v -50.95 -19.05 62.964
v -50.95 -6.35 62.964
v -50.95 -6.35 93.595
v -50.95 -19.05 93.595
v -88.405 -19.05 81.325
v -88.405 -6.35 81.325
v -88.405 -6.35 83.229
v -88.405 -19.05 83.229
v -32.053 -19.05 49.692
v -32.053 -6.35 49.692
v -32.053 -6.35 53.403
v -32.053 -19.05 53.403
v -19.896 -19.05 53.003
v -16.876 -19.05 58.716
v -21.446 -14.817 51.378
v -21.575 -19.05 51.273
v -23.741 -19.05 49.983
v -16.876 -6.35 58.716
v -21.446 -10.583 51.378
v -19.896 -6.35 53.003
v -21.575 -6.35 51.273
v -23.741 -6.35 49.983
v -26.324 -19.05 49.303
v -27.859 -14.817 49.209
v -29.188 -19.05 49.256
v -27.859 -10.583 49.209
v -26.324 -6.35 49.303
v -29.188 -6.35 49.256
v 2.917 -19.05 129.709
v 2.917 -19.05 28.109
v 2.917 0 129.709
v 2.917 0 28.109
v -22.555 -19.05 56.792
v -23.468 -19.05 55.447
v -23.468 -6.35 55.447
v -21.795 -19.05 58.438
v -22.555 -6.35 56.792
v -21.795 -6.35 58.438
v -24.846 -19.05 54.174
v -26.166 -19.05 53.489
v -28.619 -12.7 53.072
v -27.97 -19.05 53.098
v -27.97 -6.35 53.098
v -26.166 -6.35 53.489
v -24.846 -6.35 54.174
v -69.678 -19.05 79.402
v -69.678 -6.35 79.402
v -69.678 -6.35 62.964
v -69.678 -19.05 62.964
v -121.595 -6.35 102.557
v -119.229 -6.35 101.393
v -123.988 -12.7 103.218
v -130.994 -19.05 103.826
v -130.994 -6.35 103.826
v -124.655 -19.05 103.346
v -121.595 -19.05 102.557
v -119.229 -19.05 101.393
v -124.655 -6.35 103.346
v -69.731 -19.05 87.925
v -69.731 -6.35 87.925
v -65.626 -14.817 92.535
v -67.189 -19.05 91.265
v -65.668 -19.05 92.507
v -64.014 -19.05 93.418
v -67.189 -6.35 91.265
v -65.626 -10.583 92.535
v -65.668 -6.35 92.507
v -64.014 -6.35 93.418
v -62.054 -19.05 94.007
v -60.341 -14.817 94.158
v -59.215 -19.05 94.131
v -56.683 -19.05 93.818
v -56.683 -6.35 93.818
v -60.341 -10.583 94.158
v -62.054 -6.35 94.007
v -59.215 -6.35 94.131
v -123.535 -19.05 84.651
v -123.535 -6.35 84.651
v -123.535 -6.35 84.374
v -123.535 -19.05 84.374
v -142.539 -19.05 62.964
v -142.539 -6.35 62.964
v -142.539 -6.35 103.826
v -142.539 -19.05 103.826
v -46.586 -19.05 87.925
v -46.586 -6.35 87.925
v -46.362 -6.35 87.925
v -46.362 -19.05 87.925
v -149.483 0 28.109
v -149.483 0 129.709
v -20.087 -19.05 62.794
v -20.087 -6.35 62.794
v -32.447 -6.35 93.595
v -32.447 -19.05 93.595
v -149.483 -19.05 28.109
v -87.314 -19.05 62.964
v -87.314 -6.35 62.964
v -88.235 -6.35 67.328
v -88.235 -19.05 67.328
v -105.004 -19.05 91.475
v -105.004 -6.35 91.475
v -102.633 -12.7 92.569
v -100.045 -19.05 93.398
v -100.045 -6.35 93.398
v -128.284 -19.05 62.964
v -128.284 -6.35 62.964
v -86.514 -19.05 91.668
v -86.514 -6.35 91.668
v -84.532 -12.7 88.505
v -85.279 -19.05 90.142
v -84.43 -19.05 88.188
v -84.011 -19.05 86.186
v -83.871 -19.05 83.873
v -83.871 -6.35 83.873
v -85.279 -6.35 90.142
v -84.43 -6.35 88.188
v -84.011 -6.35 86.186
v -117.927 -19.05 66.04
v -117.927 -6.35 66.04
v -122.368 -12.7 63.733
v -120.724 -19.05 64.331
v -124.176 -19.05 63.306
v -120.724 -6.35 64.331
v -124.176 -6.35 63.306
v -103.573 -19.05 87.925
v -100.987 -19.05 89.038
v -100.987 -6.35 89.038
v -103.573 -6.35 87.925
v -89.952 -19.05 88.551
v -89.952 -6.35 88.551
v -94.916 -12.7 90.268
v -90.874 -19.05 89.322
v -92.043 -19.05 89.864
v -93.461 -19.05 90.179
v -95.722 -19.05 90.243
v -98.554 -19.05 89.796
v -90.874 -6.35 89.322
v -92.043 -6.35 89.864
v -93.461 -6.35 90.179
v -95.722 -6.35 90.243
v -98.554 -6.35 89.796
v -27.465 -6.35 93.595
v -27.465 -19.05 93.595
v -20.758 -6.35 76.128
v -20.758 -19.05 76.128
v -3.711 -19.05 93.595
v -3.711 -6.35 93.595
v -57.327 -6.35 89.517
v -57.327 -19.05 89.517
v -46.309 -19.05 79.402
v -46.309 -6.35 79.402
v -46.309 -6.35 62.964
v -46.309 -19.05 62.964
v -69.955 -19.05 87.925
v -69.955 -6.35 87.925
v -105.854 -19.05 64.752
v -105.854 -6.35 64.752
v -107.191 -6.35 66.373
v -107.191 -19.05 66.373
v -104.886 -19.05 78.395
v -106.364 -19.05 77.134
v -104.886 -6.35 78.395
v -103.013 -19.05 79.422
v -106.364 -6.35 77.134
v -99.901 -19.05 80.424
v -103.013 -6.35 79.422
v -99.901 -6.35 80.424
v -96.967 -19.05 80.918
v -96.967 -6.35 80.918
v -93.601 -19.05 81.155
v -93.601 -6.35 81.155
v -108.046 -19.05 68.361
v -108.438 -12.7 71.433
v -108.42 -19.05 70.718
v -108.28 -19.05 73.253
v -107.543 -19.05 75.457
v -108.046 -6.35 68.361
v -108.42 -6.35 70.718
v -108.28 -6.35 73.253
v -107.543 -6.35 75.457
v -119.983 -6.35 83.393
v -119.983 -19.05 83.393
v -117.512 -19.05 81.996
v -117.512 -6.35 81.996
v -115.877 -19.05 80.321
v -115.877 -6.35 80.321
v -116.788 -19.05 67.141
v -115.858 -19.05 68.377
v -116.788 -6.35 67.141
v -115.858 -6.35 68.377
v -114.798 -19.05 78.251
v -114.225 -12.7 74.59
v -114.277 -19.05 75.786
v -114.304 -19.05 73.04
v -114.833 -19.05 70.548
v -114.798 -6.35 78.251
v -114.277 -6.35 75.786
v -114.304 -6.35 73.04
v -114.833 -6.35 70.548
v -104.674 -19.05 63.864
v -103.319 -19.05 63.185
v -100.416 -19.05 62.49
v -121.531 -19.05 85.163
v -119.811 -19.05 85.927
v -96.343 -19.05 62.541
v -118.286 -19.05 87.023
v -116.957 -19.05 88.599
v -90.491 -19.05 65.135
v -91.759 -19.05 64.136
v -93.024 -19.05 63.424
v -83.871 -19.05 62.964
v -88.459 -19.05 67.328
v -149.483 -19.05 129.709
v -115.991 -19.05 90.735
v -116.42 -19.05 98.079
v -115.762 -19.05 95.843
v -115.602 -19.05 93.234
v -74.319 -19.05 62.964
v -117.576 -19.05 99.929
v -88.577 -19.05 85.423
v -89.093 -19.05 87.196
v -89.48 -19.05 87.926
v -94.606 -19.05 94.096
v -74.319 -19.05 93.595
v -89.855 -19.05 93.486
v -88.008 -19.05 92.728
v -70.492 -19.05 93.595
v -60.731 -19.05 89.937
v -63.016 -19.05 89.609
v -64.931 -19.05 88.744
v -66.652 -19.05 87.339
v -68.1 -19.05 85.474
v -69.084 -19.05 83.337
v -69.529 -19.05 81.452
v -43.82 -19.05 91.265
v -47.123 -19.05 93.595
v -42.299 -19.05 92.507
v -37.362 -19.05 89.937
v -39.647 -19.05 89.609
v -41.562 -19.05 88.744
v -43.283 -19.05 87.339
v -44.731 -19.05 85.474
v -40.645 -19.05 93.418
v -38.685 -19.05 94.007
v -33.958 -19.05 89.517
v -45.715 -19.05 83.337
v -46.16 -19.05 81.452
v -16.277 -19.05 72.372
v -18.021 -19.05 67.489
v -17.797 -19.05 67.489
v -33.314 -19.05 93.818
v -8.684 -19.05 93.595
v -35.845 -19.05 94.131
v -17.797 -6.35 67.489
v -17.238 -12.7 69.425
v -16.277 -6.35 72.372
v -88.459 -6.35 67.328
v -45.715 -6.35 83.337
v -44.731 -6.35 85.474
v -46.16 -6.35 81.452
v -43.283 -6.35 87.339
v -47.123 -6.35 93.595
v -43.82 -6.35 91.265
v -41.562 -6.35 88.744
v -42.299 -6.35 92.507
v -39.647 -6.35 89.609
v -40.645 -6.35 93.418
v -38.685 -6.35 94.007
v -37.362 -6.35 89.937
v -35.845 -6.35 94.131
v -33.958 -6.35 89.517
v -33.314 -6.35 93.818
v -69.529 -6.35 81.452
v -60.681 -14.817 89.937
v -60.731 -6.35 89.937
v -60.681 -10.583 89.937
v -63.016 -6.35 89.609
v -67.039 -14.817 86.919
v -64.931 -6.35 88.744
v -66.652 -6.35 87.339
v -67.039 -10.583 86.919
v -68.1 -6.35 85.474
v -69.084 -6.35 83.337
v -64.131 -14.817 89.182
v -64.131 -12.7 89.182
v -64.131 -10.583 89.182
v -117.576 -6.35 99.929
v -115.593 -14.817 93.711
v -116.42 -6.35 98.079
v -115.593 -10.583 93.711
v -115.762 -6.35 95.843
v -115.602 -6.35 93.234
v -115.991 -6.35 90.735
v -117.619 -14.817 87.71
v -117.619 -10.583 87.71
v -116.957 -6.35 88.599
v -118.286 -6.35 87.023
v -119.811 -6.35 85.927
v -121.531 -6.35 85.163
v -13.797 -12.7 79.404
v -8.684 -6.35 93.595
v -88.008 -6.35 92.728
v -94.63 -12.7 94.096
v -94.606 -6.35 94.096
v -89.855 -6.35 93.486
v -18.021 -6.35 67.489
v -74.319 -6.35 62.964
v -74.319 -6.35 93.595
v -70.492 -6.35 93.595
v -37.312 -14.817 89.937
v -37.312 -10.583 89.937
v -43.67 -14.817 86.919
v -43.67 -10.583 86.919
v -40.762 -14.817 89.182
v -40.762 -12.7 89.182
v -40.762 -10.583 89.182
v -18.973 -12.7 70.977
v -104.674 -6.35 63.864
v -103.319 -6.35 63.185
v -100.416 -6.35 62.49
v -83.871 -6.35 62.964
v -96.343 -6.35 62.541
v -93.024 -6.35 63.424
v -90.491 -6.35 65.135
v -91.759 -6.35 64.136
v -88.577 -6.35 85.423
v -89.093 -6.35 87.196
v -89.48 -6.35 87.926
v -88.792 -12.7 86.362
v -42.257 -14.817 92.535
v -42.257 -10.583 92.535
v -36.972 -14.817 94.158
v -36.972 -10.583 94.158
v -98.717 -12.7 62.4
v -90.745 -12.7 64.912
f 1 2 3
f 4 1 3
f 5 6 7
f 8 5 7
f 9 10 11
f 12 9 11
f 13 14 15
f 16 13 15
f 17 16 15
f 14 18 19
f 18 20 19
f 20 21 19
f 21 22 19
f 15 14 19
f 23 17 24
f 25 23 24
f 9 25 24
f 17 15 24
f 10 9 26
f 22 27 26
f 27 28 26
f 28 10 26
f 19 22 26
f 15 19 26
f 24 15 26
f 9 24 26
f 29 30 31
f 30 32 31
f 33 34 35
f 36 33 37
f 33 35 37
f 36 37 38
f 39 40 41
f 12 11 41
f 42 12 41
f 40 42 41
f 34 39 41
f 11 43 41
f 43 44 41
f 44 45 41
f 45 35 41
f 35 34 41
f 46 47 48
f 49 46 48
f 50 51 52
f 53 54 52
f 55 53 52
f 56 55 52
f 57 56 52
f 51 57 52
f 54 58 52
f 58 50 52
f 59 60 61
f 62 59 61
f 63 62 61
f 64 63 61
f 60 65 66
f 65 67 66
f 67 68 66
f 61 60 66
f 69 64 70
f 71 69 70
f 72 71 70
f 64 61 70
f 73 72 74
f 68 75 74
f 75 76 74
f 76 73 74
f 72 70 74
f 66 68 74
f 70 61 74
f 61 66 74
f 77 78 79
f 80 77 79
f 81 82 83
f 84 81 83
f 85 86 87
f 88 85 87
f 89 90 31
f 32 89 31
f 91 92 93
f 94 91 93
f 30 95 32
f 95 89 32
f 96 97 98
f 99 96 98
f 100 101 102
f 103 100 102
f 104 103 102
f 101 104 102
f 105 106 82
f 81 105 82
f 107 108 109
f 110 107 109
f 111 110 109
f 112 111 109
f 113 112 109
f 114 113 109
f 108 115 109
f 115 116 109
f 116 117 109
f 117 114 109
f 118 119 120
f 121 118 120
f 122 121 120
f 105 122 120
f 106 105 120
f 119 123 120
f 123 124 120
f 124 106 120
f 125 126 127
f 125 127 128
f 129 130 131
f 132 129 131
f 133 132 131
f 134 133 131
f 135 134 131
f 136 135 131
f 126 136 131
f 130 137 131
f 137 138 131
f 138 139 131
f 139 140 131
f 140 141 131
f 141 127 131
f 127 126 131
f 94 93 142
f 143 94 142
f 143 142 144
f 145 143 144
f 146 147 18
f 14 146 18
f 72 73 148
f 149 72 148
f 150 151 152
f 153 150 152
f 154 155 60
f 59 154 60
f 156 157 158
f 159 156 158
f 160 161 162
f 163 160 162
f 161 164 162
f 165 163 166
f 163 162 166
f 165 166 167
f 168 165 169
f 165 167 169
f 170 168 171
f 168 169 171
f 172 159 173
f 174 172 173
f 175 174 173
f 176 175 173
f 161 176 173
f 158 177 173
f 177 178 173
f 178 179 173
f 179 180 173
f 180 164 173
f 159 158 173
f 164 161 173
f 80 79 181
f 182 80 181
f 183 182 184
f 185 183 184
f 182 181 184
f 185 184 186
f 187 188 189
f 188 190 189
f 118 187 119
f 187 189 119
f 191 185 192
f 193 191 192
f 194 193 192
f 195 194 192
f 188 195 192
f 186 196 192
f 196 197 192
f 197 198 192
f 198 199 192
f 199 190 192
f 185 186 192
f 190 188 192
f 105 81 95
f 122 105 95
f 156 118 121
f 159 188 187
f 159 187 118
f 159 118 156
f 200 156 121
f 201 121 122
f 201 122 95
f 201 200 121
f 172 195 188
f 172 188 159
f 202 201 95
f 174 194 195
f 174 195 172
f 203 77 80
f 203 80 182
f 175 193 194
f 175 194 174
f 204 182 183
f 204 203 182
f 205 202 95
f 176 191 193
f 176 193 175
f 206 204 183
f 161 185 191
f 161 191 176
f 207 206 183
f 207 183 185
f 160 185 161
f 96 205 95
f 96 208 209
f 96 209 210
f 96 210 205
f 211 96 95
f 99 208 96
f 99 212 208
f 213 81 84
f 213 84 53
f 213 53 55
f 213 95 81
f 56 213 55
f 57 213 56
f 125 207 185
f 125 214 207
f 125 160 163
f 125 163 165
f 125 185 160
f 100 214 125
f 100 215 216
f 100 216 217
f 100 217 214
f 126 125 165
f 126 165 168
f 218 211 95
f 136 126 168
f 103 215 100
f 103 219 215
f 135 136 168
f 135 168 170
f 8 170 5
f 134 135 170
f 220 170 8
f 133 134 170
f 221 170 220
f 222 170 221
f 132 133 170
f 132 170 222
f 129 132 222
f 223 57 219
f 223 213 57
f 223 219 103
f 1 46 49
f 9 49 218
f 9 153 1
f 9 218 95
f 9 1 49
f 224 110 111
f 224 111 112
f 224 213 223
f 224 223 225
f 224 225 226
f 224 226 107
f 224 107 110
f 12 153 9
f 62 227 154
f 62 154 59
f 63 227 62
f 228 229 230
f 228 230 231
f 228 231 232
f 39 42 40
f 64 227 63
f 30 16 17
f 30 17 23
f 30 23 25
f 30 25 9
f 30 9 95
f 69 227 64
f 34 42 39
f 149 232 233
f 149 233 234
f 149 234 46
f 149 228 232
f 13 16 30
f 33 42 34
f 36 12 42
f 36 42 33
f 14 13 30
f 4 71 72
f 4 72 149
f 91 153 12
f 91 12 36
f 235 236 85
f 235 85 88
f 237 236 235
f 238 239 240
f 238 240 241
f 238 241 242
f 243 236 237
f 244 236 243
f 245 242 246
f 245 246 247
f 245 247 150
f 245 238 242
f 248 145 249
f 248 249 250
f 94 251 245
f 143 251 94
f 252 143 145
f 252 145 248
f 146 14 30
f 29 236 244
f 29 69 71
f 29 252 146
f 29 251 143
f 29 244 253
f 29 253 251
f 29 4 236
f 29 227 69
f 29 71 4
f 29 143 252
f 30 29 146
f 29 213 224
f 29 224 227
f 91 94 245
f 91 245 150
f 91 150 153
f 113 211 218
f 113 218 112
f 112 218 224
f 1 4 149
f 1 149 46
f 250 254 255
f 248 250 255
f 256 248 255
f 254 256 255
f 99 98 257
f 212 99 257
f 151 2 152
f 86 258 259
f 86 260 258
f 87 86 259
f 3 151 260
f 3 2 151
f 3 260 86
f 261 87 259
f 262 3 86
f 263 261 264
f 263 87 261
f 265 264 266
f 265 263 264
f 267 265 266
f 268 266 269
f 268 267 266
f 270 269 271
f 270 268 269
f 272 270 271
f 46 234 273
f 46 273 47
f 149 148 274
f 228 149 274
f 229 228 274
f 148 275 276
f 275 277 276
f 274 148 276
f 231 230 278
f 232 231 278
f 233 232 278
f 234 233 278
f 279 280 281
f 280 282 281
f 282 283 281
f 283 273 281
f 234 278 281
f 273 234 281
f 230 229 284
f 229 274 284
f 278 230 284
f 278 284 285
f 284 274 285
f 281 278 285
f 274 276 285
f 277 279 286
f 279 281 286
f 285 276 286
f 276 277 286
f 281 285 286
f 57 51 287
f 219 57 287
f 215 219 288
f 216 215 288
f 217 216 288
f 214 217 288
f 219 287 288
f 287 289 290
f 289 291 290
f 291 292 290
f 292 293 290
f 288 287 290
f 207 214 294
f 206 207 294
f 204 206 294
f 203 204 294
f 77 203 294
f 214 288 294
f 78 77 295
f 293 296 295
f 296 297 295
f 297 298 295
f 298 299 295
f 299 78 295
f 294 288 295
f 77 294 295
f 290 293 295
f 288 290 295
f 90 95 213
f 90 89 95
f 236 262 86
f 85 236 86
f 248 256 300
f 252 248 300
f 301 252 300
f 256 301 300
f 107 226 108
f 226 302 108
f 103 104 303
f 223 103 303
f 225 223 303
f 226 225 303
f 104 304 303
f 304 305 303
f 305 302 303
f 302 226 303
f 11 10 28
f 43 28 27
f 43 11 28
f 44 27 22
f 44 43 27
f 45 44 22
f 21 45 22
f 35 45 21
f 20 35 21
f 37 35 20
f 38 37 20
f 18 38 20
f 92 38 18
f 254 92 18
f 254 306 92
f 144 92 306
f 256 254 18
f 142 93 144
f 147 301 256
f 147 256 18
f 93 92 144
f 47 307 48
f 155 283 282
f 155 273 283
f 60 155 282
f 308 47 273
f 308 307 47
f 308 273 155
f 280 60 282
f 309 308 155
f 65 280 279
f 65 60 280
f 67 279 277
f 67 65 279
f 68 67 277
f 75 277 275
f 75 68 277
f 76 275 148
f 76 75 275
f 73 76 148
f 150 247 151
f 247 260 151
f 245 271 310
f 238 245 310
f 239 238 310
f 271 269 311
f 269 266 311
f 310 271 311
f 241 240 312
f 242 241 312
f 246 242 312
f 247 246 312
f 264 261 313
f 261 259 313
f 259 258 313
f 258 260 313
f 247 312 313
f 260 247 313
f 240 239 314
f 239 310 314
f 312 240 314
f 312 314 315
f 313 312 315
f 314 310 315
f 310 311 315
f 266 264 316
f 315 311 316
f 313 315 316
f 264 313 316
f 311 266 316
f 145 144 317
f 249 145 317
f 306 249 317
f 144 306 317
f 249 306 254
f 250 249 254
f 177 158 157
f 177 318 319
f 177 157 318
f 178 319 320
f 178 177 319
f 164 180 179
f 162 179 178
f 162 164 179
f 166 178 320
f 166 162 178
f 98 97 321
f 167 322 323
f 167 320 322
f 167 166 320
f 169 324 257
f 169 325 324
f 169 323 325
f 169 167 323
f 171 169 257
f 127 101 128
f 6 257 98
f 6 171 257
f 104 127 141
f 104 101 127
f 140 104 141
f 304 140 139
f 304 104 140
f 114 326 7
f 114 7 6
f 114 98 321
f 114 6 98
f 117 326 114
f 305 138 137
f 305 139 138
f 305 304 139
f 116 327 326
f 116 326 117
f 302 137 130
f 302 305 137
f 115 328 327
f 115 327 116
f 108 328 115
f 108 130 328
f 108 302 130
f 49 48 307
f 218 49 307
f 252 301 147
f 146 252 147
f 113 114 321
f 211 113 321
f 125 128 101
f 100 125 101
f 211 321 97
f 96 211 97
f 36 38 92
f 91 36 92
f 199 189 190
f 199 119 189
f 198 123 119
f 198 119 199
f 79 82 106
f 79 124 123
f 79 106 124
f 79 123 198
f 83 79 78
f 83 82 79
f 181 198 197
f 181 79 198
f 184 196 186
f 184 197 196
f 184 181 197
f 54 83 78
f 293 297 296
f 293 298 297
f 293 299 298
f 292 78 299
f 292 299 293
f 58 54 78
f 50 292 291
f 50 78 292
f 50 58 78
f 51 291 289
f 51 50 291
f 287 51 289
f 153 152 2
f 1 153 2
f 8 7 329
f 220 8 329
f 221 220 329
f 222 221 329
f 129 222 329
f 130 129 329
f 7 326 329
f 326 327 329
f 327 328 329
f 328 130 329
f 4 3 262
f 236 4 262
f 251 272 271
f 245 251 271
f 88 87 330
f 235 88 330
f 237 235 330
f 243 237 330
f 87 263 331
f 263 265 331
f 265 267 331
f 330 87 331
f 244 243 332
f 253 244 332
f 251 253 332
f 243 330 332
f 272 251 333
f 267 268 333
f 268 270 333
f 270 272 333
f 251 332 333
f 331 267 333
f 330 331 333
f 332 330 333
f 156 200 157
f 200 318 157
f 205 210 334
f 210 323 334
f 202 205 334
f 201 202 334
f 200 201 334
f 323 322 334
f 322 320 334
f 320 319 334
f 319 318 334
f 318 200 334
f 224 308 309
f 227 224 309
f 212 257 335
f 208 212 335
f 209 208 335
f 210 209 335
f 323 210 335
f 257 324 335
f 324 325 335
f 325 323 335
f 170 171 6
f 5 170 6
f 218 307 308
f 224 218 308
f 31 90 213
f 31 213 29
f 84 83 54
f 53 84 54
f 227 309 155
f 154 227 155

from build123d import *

# Parameters (mm, degrees)
F0_W     = 152.4
F0_H     = 101.6
F1_DEPTH = 6.35
F2_W     = 152.4
F2_H     = 101.6
F3_DEPTH = 12.7


with BuildPart() as f1:
    # F0 (on Front) → F1 (new body)
    with BuildSketch(Plane.XZ):
        with Locations((-73.2831337214, 78.9085992667)):
            Rectangle(F0_W, F0_H)
    extrude(amount=F1_DEPTH)

    # F2 (on face) → F3 (join)
    with BuildSketch(Plane.XZ.offset(6.35)):
        with Locations((-73.2831337214, 78.9085992667)):
            Rectangle(F2_W, F2_H)
        with BuildLine():
            Line((-83.8709204292, 62.9637678441), (-87.3141177383, 62.9637678441))
            Line((-87.3141177383, 62.9637678441), (-88.2352848107, 67.3281322256))
            Line((-88.2352848107, 67.3281322256), (-88.4588690515, 67.3281322256))
            add(Edge.make_bspline(
                [(-88.4588690515, 67.3281322256), (-90.7483716779, 64.4483672034), (-93.0244592498, 63.4243513802)],
                knots=[0, 0, 0, 1, 1, 1], degree=2))
            add(Edge.make_bspline(
                [(-93.0244592498, 63.4243513802), (-95.3005468216, 62.4003355571), (-98.7169140219, 62.4003355571)],
                knots=[0, 0, 0, 1, 1, 1], degree=2))
            add(Edge.make_bspline(
                [(-98.7169140219, 62.4003355571), (-103.2690891657, 62.4003355571), (-105.85372299, 64.7524417709)],
                knots=[0, 0, 0, 1, 1, 1], degree=2))
            add(Edge.make_bspline(
                [(-105.85372299, 64.7524417709), (-108.4383568142, 67.1045479847), (-108.4383568142, 71.4331388876)],
                knots=[0, 0, 0, 1, 1, 1], degree=2))
            add(Edge.make_bspline(
                [(-108.4383568142, 71.4331388876), (-108.4383568142, 80.7074131983), (-93.6013065912, 81.15458168)],
                knots=[0, 0, 0, 1, 1, 1], degree=2))
            Line((-93.6013065912, 81.15458168), (-88.4052088337, 81.324505703))
            Line((-88.4052088337, 81.324505703), (-88.4052088337, 83.2294434351))
            add(Edge.make_bspline(
                [(-88.4052088337, 83.2294434351), (-88.4052088337, 86.8336213977), (-89.9524117804, 88.5507483674)],
                knots=[0, 0, 0, 1, 1, 1], degree=2))
            add(Edge.make_bspline(
                [(-89.9524117804, 88.5507483674), (-91.4996147271, 90.2678753372), (-94.9159819274, 90.2678753372)],
                knots=[0, 0, 0, 1, 1, 1], degree=2))
            add(Edge.make_bspline(
                [(-94.9159819274, 90.2678753372), (-98.7437441308, 90.2678753372), (-103.5731637332, 87.924712493)],
                knots=[0, 0, 0, 1, 1, 1], degree=2))
            Line((-103.5731637332, 87.924712493), (-105.0041028747, 91.4752302378))
            add(Edge.make_bspline(
                [(-105.0041028747, 91.4752302378), (-102.7414303573, 92.7004718777), (-100.0450044126, 93.3980547091)],
                knots=[0, 0, 0, 1, 1, 1], degree=2))
            add(Edge.make_bspline(
                [(-100.0450044126, 93.3980547091), (-97.3485784679, 94.0956375406), (-94.6297940991, 94.0956375406)],
                knots=[0, 0, 0, 1, 1, 1], degree=2))
            add(Edge.make_bspline(
                [(-94.6297940991, 94.0956375406), (-89.156451883, 94.0956375406), (-86.5136861561, 91.6675126849)],
                knots=[0, 0, 0, 1, 1, 1], degree=2))
            add(Edge.make_bspline(
                [(-86.5136861561, 91.6675126849), (-83.8709204292, 89.2393878293), (-83.8709204292, 83.8733660488)],
                knots=[0, 0, 0, 1, 1, 1], degree=2))
            Line((-83.8709204292, 83.8733660488), (-83.8709204292, 62.9637678441))
        make_face(mode=Mode.SUBTRACT)
        with BuildLine():
            add(Edge.make_bspline(
                [(-65.6264463755, 92.5350195394), (-63.2206799439, 94.158241128), (-60.3409149217, 94.158241128)],
                knots=[0, 0, 0, 1, 1, 1], degree=2))
            add(Edge.make_bspline(
                [(-60.3409149217, 94.158241128), (-58.3018266451, 94.158241128), (-56.6830767413, 93.818393082)],
                knots=[0, 0, 0, 1, 1, 1], degree=2))
            Line((-56.6830767413, 93.818393082), (-57.326999355, 89.5166322879))
            add(Edge.make_bspline(
                [(-57.326999355, 89.5166322879), (-59.2229937174, 89.9369706607), (-60.6807629678, 89.9369706607)],
                knots=[0, 0, 0, 1, 1, 1], degree=2))
            add(Edge.make_bspline(
                [(-60.6807629678, 89.9369706607), (-64.4012047356, 89.9369706607), (-67.0394987777, 86.9185834092)],
                knots=[0, 0, 0, 1, 1, 1], degree=2))
            add(Edge.make_bspline(
                [(-67.0394987777, 86.9185834092), (-69.6777928198, 83.9001961577), (-69.6777928198, 79.4016812317)],
                knots=[0, 0, 0, 1, 1, 1], degree=2))
            Line((-69.6777928198, 79.4016812317), (-69.6777928198, 62.9637678441))
            Line((-69.6777928198, 62.9637678441), (-74.3194016599, 62.9637678441))
            Line((-74.3194016599, 62.9637678441), (-74.3194016599, 93.5948088411))
            Line((-74.3194016599, 93.5948088411), (-70.4916394565, 93.5948088411))
            Line((-70.4916394565, 93.5948088411), (-69.9550372784, 87.924712493))
            Line((-69.9550372784, 87.924712493), (-69.7314530376, 87.924712493))
            add(Edge.make_bspline(
                [(-69.7314530376, 87.924712493), (-68.0322128071, 90.9117979508), (-65.6264463755, 92.5350195394)],
                knots=[0, 0, 0, 1, 1, 1], degree=2))
        make_face(mode=Mode.SUBTRACT)
        with BuildLine():
            add(Edge.make_bspline(
                [(-42.2574215214, 92.5350195394), (-39.8516550898, 94.158241128), (-36.9718900676, 94.158241128)],
                knots=[0, 0, 0, 1, 1, 1], degree=2))
            add(Edge.make_bspline(
                [(-36.9718900676, 94.158241128), (-34.932801791, 94.158241128), (-33.3140518873, 93.818393082)],
                knots=[0, 0, 0, 1, 1, 1], degree=2))
            Line((-33.3140518873, 93.818393082), (-33.9579745009, 89.5166322879))
            add(Edge.make_bspline(
                [(-33.9579745009, 89.5166322879), (-35.8539688634, 89.9369706607), (-37.3117381137, 89.9369706607)],
                knots=[0, 0, 0, 1, 1, 1], degree=2))
            add(Edge.make_bspline(
                [(-37.3117381137, 89.9369706607), (-41.0321798815, 89.9369706607), (-43.6704739236, 86.9185834092)],
                knots=[0, 0, 0, 1, 1, 1], degree=2))
            add(Edge.make_bspline(
                [(-43.6704739236, 86.9185834092), (-46.3087679657, 83.9001961577), (-46.3087679657, 79.4016812317)],
                knots=[0, 0, 0, 1, 1, 1], degree=2))
            Line((-46.3087679657, 79.4016812317), (-46.3087679657, 62.9637678441))
            Line((-46.3087679657, 62.9637678441), (-50.9503768058, 62.9637678441))
            Line((-50.9503768058, 62.9637678441), (-50.9503768058, 93.5948088411))
            Line((-50.9503768058, 93.5948088411), (-47.1226146024, 93.5948088411))
            Line((-47.1226146024, 93.5948088411), (-46.5860124244, 87.924712493))
            Line((-46.5860124244, 87.924712493), (-46.3624281835, 87.924712493))
            add(Edge.make_bspline(
                [(-46.3624281835, 87.924712493), (-44.663187953, 90.9117979508), (-42.2574215214, 92.5350195394)],
                knots=[0, 0, 0, 1, 1, 1], degree=2))
        make_face(mode=Mode.SUBTRACT)
        with BuildLine():
            Line((-20.0868081983, 62.793843821), (-32.4465450327, 93.5948088411))
            Line((-32.4465450327, 93.5948088411), (-27.4650881465, 93.5948088411))
            Line((-27.4650881465, 93.5948088411), (-20.7575609209, 76.1284079456))
            add(Edge.make_bspline(
                [(-20.7575609209, 76.1284079456), (-18.5574919909, 70.1452936603), (-18.0208898128, 67.489112879)],
                knots=[0, 0, 0, 1, 1, 1], degree=2))
            Line((-18.0208898128, 67.489112879), (-17.797305572, 67.489112879))
            add(Edge.make_bspline(
                [(-17.797305572, 67.489112879), (-17.4395707866, 68.9200520204), (-16.2769327342, 72.3721926992)],
                knots=[0, 0, 0, 1, 1, 1], degree=2))
            add(Edge.make_bspline(
                [(-16.2769327342, 72.3721926992), (-15.1142946817, 75.824333378), (-8.6840119148, 93.5948088411)],
                knots=[0, 0, 0, 1, 1, 1], degree=2))
            Line((-8.6840119148, 93.5948088411), (-3.7114983982, 93.5948088411))
            Line((-3.7114983982, 93.5948088411), (-16.8761384997, 58.7156672679))
            add(Edge.make_bspline(
                [(-16.8761384997, 58.7156672679), (-18.8347364495, 53.5463996193), (-21.4462003827, 51.377632483)],
                knots=[0, 0, 0, 1, 1, 1], degree=2))
            add(Edge.make_bspline(
                [(-21.4462003827, 51.377632483), (-24.0576643159, 49.2088653467), (-27.8585964104, 49.2088653467)],
                knots=[0, 0, 0, 1, 1, 1], degree=2))
            add(Edge.make_bspline(
                [(-27.8585964104, 49.2088653467), (-29.9871183834, 49.2088653467), (-32.0530367688, 49.691807307)],
                knots=[0, 0, 0, 1, 1, 1], degree=2))
            Line((-32.0530367688, 49.691807307), (-32.0530367688, 53.4033057052))
            add(Edge.make_bspline(
                [(-32.0530367688, 53.4033057052), (-30.5147771918, 53.0724010287), (-28.6187828293, 53.0724010287)],
                knots=[0, 0, 0, 1, 1, 1], degree=2))
            add(Edge.make_bspline(
                [(-28.6187828293, 53.0724010287), (-23.834080075, 53.0724010287), (-21.7949917985, 58.4384228092)],
                knots=[0, 0, 0, 1, 1, 1], degree=2))
            Line((-21.7949917985, 58.4384228092), (-20.0868081983, 62.793843821))
        make_face(mode=Mode.SUBTRACT)
        with BuildLine():
            Line((-142.5394252293, 62.9637678441), (-142.5394252293, 103.8260237026))
            Line((-142.5394252293, 103.8260237026), (-130.9935350316, 103.8260237026))
            add(Edge.make_bspline(
                [(-130.9935350316, 103.8260237026), (-122.8640120341, 103.8260237026), (-119.2285322779, 101.3934271621)],
                knots=[0, 0, 0, 1, 1, 1], degree=2))
            add(Edge.make_bspline(
                [(-119.2285322779, 101.3934271621), (-115.5930525216, 98.9608306216), (-115.5930525216, 93.7110726463)],
                knots=[0, 0, 0, 1, 1, 1], degree=2))
            add(Edge.make_bspline(
                [(-115.5930525216, 93.7110726463), (-115.5930525216, 90.0711212052), (-117.6187257437, 87.7100716218)],
                knots=[0, 0, 0, 1, 1, 1], degree=2))
            add(Edge.make_bspline(
                [(-117.6187257437, 87.7100716218), (-119.6443989658, 85.3490220384), (-123.5347647567, 84.6514392069)],
                knots=[0, 0, 0, 1, 1, 1], degree=2))
            Line((-123.5347647567, 84.6514392069), (-123.5347647567, 84.3741947483))
            add(Edge.make_bspline(
                [(-123.5347647567, 84.3741947483), (-114.2247169675, 82.7822749534), (-114.2247169675, 74.5901483685)],
                knots=[0, 0, 0, 1, 1, 1], degree=2))
            add(Edge.make_bspline(
                [(-114.2247169675, 74.5901483685), (-114.2247169675, 69.1168061524), (-117.9272719961, 66.0402869982)],
                knots=[0, 0, 0, 1, 1, 1], degree=2))
            add(Edge.make_bspline(
                [(-117.9272719961, 66.0402869982), (-121.6298270246, 62.9637678441), (-128.2836940324, 62.9637678441)],
                knots=[0, 0, 0, 1, 1, 1], degree=2))
            Line((-128.2836940324, 62.9637678441), (-142.5394252293, 62.9637678441))
        make_face(mode=Mode.SUBTRACT)
    extrude(amount=F3_DEPTH)


solid = f1.part
